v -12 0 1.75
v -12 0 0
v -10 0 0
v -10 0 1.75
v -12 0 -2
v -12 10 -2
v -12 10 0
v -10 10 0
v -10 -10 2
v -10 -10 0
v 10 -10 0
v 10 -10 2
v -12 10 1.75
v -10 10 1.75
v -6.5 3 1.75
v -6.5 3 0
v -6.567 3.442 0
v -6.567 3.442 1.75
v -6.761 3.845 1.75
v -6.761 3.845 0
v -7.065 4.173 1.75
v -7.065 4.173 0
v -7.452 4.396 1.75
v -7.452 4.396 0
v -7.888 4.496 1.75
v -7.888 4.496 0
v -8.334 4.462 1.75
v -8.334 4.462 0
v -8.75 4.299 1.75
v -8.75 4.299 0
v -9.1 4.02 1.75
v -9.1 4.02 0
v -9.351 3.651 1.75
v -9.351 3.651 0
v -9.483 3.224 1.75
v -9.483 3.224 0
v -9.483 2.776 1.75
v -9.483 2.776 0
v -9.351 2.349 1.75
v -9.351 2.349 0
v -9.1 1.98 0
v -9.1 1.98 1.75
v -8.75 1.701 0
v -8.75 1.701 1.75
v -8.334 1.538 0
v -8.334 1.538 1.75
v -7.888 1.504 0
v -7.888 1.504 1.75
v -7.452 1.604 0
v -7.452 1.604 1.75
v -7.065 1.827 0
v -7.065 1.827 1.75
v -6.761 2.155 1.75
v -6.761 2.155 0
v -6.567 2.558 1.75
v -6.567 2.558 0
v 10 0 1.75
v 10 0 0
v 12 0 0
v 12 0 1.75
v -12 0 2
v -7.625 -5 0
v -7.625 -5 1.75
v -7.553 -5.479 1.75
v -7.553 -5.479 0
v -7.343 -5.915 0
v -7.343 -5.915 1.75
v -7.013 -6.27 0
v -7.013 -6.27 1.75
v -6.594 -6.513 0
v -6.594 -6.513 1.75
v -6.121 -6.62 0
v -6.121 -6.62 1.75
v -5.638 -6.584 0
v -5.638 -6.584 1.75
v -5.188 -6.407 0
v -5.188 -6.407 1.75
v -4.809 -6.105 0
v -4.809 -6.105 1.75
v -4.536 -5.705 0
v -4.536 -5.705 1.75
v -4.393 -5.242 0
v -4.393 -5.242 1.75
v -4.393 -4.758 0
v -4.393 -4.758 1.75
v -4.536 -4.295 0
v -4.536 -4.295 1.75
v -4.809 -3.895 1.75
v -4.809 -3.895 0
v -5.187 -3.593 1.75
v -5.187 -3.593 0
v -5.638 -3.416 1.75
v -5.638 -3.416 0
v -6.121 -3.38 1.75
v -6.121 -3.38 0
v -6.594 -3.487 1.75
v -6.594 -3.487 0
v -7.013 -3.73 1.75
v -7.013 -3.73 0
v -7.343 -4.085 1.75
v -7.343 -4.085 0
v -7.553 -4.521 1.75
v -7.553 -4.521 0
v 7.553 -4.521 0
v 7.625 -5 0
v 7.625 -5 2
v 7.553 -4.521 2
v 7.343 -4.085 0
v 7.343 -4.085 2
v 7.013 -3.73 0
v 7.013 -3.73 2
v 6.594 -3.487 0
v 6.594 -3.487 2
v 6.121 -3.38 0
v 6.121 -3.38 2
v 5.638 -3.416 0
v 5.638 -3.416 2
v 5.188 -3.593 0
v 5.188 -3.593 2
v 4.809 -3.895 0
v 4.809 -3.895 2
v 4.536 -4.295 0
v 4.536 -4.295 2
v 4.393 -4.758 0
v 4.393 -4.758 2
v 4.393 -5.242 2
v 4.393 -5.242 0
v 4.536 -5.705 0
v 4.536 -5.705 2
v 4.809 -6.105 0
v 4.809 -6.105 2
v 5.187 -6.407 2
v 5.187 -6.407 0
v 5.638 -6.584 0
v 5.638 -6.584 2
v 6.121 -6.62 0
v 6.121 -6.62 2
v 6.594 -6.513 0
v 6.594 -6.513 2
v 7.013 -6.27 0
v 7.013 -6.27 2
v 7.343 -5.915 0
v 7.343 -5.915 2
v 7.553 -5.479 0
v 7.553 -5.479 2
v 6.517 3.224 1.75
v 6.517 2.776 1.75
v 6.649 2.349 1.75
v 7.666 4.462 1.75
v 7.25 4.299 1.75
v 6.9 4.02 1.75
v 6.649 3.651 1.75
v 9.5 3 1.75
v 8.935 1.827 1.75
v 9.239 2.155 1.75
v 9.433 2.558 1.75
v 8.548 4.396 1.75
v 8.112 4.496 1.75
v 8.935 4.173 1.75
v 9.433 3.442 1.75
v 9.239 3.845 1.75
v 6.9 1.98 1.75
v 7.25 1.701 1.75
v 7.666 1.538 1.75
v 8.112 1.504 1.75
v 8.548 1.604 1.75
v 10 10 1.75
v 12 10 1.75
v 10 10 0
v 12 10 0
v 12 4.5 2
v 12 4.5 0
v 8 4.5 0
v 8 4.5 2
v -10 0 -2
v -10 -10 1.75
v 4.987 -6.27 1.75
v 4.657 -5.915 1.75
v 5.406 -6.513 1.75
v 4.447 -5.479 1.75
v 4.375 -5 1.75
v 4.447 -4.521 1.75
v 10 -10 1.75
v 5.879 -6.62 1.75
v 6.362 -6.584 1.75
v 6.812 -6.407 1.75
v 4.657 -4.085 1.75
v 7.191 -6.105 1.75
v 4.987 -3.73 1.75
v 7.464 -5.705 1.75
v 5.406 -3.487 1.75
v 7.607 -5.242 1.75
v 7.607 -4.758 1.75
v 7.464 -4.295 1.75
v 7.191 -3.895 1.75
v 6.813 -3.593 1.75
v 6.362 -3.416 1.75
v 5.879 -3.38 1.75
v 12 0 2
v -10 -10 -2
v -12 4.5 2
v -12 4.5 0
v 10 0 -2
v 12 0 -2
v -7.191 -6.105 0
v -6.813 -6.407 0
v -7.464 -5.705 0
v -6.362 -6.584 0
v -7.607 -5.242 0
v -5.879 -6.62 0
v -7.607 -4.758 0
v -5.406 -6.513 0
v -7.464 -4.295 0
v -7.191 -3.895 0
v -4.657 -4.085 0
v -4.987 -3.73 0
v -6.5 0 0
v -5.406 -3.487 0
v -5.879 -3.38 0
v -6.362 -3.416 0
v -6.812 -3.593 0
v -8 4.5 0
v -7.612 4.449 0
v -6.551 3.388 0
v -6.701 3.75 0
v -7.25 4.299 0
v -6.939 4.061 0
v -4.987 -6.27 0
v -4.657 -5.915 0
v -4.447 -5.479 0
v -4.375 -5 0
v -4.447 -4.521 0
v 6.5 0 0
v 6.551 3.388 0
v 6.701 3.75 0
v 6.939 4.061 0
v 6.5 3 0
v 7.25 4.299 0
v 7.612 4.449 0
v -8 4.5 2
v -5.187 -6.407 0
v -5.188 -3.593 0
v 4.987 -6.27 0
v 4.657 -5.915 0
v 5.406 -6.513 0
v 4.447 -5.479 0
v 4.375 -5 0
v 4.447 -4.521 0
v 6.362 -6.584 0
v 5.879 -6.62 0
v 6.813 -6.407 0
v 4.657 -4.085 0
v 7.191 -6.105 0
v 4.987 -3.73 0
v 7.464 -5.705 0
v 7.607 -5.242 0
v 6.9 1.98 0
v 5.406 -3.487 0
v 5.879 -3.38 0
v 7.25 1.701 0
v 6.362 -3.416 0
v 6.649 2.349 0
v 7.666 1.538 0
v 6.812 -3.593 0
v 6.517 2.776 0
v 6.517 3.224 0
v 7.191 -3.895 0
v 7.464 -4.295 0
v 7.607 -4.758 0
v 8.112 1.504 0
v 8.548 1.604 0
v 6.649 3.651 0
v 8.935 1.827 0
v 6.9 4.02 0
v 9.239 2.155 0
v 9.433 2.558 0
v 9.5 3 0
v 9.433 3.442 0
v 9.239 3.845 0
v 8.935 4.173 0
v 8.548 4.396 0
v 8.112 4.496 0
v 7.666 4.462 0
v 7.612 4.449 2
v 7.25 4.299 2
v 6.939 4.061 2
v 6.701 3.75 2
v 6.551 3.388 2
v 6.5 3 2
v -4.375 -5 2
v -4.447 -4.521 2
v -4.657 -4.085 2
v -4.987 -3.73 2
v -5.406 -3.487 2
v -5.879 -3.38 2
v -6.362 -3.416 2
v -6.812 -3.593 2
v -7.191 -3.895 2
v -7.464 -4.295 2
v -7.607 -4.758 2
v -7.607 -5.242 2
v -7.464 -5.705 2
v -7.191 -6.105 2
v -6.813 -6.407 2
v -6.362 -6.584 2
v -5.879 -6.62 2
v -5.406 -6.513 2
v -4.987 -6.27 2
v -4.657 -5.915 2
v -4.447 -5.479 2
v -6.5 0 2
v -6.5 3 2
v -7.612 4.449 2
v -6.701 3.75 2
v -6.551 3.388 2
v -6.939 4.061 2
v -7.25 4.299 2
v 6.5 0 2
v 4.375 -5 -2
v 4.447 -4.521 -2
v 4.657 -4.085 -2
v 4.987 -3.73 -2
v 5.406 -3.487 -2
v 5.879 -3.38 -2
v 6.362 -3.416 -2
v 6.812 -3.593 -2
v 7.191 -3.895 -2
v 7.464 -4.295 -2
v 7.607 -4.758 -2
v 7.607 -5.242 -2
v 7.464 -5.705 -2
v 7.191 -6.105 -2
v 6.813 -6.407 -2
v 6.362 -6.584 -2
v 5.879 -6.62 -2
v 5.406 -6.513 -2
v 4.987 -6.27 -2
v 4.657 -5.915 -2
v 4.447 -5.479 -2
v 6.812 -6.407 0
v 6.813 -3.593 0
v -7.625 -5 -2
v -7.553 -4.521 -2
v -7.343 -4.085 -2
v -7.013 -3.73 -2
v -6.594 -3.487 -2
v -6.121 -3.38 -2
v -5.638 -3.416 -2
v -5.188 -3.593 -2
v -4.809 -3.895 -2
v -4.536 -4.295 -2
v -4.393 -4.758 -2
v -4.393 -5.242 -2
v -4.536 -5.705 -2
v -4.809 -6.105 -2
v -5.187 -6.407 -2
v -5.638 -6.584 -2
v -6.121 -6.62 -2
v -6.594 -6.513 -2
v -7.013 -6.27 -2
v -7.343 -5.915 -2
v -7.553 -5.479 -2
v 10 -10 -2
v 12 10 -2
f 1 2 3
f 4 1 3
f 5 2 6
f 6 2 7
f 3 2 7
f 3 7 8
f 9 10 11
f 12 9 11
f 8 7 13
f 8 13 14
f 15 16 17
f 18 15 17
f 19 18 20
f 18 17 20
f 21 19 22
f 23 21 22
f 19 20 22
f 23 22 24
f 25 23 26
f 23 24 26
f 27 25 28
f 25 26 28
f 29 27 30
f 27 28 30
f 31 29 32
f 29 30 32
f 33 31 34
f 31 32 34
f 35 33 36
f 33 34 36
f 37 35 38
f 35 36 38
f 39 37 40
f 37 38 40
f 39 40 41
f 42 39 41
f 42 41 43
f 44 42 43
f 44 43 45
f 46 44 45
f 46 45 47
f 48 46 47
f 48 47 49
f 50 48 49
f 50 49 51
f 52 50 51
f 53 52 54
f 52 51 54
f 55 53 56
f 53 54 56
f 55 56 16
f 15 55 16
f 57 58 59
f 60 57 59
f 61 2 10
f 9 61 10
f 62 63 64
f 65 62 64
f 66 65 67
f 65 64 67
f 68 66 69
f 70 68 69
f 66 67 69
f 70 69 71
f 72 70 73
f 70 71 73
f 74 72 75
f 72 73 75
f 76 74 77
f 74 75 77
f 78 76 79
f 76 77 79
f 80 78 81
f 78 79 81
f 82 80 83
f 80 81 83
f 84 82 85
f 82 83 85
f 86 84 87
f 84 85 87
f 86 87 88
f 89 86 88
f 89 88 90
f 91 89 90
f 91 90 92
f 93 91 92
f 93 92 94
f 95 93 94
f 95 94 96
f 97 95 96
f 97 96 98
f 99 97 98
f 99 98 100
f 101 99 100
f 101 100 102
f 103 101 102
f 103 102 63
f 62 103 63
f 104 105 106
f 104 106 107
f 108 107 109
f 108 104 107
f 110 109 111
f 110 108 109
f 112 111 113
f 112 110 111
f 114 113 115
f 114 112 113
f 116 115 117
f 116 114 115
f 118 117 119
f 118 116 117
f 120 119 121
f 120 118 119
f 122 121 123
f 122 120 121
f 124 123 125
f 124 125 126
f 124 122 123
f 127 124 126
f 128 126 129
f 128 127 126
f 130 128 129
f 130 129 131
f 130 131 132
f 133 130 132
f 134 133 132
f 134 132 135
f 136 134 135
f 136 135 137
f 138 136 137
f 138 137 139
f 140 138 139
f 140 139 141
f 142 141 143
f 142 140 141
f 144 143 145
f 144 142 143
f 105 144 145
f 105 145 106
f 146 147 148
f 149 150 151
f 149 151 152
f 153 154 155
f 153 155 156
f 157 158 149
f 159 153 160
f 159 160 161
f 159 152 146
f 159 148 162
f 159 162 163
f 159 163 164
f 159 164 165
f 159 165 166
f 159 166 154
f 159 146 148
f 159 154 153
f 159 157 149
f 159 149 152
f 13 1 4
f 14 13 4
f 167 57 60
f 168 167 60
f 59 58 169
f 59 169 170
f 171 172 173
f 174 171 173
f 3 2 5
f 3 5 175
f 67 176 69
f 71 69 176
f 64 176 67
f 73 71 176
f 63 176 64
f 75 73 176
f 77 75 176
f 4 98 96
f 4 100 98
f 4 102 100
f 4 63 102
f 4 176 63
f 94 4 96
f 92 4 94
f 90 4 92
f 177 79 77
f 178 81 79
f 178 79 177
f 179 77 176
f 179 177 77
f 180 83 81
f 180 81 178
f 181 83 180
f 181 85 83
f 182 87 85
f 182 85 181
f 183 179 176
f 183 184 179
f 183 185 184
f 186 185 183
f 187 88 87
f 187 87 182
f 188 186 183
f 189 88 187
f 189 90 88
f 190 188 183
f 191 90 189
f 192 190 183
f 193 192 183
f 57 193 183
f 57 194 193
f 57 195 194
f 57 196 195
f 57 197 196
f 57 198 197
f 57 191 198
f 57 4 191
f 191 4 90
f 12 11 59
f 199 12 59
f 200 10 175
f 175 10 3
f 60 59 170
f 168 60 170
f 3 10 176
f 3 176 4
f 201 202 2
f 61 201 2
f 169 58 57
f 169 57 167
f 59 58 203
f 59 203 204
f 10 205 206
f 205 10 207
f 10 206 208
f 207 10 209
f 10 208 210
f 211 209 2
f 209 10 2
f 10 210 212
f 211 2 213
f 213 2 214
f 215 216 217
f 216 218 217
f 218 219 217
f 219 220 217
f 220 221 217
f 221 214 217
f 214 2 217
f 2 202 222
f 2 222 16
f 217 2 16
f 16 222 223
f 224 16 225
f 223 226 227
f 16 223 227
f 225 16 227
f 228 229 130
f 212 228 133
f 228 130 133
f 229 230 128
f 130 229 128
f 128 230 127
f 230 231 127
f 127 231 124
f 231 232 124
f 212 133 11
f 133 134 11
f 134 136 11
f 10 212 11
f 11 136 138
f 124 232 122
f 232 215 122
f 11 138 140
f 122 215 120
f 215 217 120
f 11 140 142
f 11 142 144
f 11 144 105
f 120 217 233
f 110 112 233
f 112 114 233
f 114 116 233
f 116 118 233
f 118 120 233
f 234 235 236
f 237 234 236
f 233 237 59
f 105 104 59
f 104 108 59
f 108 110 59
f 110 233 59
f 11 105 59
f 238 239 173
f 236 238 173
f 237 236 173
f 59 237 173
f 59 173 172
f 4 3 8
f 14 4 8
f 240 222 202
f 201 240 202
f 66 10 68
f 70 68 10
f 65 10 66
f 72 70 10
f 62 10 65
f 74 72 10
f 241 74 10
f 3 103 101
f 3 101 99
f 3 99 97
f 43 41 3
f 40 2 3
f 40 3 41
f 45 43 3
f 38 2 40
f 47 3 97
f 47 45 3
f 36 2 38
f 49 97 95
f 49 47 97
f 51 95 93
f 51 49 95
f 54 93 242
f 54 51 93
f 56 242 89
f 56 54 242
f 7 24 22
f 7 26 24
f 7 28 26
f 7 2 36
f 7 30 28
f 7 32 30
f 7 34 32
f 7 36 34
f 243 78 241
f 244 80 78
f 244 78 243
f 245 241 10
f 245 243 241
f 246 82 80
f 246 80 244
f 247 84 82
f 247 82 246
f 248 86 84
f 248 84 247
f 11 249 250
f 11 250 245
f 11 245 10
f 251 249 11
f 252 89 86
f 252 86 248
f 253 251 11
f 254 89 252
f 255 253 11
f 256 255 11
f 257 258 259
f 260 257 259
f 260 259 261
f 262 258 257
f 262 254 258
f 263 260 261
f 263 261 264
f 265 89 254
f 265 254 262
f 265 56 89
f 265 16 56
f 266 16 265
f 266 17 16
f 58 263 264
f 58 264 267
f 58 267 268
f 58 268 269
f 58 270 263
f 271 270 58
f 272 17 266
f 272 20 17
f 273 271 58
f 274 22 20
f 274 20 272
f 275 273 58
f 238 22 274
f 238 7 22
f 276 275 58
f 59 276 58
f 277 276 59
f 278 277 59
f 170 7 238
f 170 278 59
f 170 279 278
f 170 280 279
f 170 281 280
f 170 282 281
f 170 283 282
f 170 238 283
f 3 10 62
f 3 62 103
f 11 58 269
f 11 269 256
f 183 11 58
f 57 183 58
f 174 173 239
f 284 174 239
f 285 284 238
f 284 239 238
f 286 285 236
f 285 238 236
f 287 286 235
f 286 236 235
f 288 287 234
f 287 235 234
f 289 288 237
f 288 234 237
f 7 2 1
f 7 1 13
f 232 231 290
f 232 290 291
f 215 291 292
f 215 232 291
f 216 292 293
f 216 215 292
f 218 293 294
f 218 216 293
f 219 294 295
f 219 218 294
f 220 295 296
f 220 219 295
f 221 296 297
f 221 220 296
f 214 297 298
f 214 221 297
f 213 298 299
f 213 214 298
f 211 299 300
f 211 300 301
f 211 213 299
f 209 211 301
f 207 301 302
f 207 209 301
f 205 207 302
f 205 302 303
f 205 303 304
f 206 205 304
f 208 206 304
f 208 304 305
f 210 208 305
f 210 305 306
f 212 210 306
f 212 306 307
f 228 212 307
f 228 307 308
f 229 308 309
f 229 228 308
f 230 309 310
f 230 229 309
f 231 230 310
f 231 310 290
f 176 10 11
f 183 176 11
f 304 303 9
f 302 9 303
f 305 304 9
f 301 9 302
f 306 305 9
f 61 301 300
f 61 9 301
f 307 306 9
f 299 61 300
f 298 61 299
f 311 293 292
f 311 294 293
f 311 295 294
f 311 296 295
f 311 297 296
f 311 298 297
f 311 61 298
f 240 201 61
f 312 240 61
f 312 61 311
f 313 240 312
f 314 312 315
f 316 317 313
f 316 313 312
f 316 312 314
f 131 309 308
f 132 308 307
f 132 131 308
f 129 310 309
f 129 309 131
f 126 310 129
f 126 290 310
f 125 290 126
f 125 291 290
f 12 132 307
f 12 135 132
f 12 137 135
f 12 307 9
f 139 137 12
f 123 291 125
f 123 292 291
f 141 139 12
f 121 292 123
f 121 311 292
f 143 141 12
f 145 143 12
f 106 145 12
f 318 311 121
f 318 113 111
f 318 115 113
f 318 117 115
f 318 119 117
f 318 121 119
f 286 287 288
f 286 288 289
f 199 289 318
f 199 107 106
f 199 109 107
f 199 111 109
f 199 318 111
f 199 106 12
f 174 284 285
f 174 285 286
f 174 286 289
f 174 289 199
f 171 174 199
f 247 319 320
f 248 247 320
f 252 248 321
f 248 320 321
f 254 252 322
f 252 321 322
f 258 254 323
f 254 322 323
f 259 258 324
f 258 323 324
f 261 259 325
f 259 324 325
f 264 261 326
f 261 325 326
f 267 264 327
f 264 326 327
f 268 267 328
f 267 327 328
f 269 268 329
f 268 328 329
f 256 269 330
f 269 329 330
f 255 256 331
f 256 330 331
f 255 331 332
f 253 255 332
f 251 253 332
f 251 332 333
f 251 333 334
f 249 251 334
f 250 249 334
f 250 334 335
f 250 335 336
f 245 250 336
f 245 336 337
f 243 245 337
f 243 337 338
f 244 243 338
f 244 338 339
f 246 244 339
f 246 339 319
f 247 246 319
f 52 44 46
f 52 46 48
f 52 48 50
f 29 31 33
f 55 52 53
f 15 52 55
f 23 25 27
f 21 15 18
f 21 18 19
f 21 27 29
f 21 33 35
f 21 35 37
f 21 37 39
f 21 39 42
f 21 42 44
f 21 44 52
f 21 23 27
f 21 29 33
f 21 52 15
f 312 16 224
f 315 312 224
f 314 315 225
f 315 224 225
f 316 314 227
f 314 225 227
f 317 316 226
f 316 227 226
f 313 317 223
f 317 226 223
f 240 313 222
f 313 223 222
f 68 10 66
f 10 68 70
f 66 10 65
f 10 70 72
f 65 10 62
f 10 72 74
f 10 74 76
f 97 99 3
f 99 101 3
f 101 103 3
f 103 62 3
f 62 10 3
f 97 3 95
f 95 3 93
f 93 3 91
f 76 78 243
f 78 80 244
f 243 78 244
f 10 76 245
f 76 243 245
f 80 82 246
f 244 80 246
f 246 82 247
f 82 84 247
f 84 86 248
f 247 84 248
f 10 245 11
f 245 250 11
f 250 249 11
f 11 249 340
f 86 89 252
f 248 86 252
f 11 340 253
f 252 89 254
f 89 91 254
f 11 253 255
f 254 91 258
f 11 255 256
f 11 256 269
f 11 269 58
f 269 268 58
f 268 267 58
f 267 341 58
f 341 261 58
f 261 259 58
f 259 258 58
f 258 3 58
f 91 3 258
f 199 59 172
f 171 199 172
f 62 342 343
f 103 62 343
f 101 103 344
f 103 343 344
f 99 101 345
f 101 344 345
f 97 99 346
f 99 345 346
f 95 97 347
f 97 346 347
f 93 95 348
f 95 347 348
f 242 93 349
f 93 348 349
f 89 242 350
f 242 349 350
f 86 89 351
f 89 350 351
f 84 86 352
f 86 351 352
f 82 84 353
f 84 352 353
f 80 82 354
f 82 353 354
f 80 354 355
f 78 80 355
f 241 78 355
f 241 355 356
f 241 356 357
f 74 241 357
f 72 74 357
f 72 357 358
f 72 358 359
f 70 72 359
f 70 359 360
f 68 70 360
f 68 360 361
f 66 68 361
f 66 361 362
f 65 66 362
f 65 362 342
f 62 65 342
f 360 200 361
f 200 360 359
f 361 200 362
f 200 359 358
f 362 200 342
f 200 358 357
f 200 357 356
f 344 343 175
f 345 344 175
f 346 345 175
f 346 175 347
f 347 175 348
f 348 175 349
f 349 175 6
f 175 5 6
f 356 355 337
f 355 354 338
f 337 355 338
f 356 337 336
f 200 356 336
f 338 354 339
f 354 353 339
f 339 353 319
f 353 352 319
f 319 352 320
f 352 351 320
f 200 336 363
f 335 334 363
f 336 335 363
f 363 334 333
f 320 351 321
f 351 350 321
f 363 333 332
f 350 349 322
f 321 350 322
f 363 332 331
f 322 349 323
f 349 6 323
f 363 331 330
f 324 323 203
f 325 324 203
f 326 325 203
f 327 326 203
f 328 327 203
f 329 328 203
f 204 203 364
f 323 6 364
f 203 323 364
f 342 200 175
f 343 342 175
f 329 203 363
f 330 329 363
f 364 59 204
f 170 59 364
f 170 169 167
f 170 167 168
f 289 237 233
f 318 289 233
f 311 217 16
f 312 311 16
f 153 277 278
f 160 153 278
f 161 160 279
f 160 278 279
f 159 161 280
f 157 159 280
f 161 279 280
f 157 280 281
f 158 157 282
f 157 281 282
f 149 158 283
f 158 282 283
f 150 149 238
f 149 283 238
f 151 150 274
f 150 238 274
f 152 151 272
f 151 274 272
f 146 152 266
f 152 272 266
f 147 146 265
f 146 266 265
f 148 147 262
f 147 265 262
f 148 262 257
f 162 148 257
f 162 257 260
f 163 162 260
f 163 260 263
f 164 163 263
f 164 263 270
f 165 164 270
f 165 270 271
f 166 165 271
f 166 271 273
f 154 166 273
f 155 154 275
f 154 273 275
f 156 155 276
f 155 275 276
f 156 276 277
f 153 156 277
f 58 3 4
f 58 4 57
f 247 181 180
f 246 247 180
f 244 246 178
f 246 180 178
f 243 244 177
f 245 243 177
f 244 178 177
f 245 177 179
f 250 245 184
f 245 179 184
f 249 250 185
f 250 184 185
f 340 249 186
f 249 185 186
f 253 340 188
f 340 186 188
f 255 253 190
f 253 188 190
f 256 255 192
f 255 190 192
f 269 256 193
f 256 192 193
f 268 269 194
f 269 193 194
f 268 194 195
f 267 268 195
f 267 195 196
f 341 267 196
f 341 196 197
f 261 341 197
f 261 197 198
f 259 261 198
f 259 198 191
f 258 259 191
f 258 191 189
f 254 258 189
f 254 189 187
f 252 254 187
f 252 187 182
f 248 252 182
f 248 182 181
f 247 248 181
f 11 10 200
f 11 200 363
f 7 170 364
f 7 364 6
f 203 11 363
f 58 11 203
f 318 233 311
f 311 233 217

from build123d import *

# Parameters (mm, degrees)
F0_W      = 20
F0_H      = 10
F1_DEPTH  = 1.75
F0_W_2    = 2
F2_DEPTH  = 1.75
F3_DEPTH  = 1.75
F0_R      = 1.5
F4_DEPTH  = 2
F5_DEPTH  = 1.75
F6_D      = 3.25
F7_D      = 3.25
F8_D      = 3.25
F9_D      = 3.25
F10_R     = 1.625
F11_DEPTH = 2


with BuildPart() as f1:
    # F0 (on Top) → F1 (new body)
    with BuildSketch(Plane.XY):
        with Locations((0, -5)):
            Rectangle(F0_W, F0_H)
    extrude(amount=F1_DEPTH)

    # F6 (through all)
    with Locations(Plane(origin=(0, 0, 0), x_dir=(1, 0, 0), z_dir=(0, 0, -1))):
        with Locations((-6, 5)):
            Hole(F6_D / 2)

    # F7 (through all)
    with Locations(Plane(origin=(0, 0, 0), x_dir=(1, 0, 0), z_dir=(0, 0, -1))):
        with Locations((6, 5)):
            Hole(F7_D / 2)


with BuildPart() as f2:
    # F0 (on Top) → F2 (new body)
    with BuildSketch(Plane.XY):
        with Locations((11, 5)):
            Rectangle(F0_W_2, F0_H)
    extrude(amount=F2_DEPTH)


with BuildPart() as f3:
    # F0 (on Top) → F3 (new body)
    with BuildSketch(Plane.XY):
        with Locations((-11, 5)):
            Rectangle(F0_W_2, F0_H)
    extrude(amount=F3_DEPTH)


with BuildPart() as f4:
    # F0 (on Top) → F4 (new body)
    with BuildSketch(Plane.XY):
        with Locations((-11, 5)):
            Rectangle(F0_W_2, F0_H)
        with Locations((0, 5)):
            Rectangle(F0_W, F0_H)
        with Locations((-8, 3)):
            Circle(F0_R, mode=Mode.SUBTRACT)
        with Locations((8, 3)):
            Circle(F0_R, mode=Mode.SUBTRACT)
        with Locations((-8, 3)):
            Circle(F0_R)
        with Locations((8, 3)):
            Circle(F0_R)
        with Locations((11, 5)):
            Rectangle(F0_W_2, F0_H)
        with Locations((0, -5)):
            Rectangle(F0_W, F0_H)
    extrude(amount=-F4_DEPTH)

    # F0 (on Top) → F5 (join)
    with BuildSketch(Plane.XY):
        with Locations((-8, 3)):
            Circle(F0_R)
        with Locations((8, 3)):
            Circle(F0_R)
    extrude(amount=F5_DEPTH)

    # F8 (through all)
    with Locations(Plane.XY):
        with Locations((-6, -5)):
            Hole(F8_D / 2)

    # F9 (through all)
    with Locations(Plane.XY):
        with Locations((6, -5)):
            Hole(F9_D / 2)


with BuildPart() as f11:
    # F10 (on Top) → F11 (new body)
    with BuildSketch(Plane.XY):
        with BuildLine():
            Line((-12, 0), (-10, -10))
            Line((-10, -10), (10, -10))
            Line((10, -10), (12, 0))
            Line((12, 0), (12, 4.5))
            Line((12, 4.5), (8, 4.5))
            ThreePointArc((8, 4.5), (6.9393398282, 4.0606601718), (6.5, 3))
            Line((6.5, 3), (6.5, 0))
            Line((6.5, 0), (-6.5, 0))
            Line((-6.5, 0), (-6.5, 3))
            ThreePointArc((-6.5, 3), (-6.9393398282, 4.0606601718), (-8, 4.5))
            Line((-8, 4.5), (-12, 4.5))
            Line((-12, 4.5), (-12, 0))
        make_face()
        with Locations((-6, -5)):
            Circle(F10_R, mode=Mode.SUBTRACT)
        with Locations((6, -5)):
            Circle(F10_R, mode=Mode.SUBTRACT)
    extrude(amount=F11_DEPTH)


solid = Compound([f1.part, f2.part, f3.part, f4.part, f11.part])
